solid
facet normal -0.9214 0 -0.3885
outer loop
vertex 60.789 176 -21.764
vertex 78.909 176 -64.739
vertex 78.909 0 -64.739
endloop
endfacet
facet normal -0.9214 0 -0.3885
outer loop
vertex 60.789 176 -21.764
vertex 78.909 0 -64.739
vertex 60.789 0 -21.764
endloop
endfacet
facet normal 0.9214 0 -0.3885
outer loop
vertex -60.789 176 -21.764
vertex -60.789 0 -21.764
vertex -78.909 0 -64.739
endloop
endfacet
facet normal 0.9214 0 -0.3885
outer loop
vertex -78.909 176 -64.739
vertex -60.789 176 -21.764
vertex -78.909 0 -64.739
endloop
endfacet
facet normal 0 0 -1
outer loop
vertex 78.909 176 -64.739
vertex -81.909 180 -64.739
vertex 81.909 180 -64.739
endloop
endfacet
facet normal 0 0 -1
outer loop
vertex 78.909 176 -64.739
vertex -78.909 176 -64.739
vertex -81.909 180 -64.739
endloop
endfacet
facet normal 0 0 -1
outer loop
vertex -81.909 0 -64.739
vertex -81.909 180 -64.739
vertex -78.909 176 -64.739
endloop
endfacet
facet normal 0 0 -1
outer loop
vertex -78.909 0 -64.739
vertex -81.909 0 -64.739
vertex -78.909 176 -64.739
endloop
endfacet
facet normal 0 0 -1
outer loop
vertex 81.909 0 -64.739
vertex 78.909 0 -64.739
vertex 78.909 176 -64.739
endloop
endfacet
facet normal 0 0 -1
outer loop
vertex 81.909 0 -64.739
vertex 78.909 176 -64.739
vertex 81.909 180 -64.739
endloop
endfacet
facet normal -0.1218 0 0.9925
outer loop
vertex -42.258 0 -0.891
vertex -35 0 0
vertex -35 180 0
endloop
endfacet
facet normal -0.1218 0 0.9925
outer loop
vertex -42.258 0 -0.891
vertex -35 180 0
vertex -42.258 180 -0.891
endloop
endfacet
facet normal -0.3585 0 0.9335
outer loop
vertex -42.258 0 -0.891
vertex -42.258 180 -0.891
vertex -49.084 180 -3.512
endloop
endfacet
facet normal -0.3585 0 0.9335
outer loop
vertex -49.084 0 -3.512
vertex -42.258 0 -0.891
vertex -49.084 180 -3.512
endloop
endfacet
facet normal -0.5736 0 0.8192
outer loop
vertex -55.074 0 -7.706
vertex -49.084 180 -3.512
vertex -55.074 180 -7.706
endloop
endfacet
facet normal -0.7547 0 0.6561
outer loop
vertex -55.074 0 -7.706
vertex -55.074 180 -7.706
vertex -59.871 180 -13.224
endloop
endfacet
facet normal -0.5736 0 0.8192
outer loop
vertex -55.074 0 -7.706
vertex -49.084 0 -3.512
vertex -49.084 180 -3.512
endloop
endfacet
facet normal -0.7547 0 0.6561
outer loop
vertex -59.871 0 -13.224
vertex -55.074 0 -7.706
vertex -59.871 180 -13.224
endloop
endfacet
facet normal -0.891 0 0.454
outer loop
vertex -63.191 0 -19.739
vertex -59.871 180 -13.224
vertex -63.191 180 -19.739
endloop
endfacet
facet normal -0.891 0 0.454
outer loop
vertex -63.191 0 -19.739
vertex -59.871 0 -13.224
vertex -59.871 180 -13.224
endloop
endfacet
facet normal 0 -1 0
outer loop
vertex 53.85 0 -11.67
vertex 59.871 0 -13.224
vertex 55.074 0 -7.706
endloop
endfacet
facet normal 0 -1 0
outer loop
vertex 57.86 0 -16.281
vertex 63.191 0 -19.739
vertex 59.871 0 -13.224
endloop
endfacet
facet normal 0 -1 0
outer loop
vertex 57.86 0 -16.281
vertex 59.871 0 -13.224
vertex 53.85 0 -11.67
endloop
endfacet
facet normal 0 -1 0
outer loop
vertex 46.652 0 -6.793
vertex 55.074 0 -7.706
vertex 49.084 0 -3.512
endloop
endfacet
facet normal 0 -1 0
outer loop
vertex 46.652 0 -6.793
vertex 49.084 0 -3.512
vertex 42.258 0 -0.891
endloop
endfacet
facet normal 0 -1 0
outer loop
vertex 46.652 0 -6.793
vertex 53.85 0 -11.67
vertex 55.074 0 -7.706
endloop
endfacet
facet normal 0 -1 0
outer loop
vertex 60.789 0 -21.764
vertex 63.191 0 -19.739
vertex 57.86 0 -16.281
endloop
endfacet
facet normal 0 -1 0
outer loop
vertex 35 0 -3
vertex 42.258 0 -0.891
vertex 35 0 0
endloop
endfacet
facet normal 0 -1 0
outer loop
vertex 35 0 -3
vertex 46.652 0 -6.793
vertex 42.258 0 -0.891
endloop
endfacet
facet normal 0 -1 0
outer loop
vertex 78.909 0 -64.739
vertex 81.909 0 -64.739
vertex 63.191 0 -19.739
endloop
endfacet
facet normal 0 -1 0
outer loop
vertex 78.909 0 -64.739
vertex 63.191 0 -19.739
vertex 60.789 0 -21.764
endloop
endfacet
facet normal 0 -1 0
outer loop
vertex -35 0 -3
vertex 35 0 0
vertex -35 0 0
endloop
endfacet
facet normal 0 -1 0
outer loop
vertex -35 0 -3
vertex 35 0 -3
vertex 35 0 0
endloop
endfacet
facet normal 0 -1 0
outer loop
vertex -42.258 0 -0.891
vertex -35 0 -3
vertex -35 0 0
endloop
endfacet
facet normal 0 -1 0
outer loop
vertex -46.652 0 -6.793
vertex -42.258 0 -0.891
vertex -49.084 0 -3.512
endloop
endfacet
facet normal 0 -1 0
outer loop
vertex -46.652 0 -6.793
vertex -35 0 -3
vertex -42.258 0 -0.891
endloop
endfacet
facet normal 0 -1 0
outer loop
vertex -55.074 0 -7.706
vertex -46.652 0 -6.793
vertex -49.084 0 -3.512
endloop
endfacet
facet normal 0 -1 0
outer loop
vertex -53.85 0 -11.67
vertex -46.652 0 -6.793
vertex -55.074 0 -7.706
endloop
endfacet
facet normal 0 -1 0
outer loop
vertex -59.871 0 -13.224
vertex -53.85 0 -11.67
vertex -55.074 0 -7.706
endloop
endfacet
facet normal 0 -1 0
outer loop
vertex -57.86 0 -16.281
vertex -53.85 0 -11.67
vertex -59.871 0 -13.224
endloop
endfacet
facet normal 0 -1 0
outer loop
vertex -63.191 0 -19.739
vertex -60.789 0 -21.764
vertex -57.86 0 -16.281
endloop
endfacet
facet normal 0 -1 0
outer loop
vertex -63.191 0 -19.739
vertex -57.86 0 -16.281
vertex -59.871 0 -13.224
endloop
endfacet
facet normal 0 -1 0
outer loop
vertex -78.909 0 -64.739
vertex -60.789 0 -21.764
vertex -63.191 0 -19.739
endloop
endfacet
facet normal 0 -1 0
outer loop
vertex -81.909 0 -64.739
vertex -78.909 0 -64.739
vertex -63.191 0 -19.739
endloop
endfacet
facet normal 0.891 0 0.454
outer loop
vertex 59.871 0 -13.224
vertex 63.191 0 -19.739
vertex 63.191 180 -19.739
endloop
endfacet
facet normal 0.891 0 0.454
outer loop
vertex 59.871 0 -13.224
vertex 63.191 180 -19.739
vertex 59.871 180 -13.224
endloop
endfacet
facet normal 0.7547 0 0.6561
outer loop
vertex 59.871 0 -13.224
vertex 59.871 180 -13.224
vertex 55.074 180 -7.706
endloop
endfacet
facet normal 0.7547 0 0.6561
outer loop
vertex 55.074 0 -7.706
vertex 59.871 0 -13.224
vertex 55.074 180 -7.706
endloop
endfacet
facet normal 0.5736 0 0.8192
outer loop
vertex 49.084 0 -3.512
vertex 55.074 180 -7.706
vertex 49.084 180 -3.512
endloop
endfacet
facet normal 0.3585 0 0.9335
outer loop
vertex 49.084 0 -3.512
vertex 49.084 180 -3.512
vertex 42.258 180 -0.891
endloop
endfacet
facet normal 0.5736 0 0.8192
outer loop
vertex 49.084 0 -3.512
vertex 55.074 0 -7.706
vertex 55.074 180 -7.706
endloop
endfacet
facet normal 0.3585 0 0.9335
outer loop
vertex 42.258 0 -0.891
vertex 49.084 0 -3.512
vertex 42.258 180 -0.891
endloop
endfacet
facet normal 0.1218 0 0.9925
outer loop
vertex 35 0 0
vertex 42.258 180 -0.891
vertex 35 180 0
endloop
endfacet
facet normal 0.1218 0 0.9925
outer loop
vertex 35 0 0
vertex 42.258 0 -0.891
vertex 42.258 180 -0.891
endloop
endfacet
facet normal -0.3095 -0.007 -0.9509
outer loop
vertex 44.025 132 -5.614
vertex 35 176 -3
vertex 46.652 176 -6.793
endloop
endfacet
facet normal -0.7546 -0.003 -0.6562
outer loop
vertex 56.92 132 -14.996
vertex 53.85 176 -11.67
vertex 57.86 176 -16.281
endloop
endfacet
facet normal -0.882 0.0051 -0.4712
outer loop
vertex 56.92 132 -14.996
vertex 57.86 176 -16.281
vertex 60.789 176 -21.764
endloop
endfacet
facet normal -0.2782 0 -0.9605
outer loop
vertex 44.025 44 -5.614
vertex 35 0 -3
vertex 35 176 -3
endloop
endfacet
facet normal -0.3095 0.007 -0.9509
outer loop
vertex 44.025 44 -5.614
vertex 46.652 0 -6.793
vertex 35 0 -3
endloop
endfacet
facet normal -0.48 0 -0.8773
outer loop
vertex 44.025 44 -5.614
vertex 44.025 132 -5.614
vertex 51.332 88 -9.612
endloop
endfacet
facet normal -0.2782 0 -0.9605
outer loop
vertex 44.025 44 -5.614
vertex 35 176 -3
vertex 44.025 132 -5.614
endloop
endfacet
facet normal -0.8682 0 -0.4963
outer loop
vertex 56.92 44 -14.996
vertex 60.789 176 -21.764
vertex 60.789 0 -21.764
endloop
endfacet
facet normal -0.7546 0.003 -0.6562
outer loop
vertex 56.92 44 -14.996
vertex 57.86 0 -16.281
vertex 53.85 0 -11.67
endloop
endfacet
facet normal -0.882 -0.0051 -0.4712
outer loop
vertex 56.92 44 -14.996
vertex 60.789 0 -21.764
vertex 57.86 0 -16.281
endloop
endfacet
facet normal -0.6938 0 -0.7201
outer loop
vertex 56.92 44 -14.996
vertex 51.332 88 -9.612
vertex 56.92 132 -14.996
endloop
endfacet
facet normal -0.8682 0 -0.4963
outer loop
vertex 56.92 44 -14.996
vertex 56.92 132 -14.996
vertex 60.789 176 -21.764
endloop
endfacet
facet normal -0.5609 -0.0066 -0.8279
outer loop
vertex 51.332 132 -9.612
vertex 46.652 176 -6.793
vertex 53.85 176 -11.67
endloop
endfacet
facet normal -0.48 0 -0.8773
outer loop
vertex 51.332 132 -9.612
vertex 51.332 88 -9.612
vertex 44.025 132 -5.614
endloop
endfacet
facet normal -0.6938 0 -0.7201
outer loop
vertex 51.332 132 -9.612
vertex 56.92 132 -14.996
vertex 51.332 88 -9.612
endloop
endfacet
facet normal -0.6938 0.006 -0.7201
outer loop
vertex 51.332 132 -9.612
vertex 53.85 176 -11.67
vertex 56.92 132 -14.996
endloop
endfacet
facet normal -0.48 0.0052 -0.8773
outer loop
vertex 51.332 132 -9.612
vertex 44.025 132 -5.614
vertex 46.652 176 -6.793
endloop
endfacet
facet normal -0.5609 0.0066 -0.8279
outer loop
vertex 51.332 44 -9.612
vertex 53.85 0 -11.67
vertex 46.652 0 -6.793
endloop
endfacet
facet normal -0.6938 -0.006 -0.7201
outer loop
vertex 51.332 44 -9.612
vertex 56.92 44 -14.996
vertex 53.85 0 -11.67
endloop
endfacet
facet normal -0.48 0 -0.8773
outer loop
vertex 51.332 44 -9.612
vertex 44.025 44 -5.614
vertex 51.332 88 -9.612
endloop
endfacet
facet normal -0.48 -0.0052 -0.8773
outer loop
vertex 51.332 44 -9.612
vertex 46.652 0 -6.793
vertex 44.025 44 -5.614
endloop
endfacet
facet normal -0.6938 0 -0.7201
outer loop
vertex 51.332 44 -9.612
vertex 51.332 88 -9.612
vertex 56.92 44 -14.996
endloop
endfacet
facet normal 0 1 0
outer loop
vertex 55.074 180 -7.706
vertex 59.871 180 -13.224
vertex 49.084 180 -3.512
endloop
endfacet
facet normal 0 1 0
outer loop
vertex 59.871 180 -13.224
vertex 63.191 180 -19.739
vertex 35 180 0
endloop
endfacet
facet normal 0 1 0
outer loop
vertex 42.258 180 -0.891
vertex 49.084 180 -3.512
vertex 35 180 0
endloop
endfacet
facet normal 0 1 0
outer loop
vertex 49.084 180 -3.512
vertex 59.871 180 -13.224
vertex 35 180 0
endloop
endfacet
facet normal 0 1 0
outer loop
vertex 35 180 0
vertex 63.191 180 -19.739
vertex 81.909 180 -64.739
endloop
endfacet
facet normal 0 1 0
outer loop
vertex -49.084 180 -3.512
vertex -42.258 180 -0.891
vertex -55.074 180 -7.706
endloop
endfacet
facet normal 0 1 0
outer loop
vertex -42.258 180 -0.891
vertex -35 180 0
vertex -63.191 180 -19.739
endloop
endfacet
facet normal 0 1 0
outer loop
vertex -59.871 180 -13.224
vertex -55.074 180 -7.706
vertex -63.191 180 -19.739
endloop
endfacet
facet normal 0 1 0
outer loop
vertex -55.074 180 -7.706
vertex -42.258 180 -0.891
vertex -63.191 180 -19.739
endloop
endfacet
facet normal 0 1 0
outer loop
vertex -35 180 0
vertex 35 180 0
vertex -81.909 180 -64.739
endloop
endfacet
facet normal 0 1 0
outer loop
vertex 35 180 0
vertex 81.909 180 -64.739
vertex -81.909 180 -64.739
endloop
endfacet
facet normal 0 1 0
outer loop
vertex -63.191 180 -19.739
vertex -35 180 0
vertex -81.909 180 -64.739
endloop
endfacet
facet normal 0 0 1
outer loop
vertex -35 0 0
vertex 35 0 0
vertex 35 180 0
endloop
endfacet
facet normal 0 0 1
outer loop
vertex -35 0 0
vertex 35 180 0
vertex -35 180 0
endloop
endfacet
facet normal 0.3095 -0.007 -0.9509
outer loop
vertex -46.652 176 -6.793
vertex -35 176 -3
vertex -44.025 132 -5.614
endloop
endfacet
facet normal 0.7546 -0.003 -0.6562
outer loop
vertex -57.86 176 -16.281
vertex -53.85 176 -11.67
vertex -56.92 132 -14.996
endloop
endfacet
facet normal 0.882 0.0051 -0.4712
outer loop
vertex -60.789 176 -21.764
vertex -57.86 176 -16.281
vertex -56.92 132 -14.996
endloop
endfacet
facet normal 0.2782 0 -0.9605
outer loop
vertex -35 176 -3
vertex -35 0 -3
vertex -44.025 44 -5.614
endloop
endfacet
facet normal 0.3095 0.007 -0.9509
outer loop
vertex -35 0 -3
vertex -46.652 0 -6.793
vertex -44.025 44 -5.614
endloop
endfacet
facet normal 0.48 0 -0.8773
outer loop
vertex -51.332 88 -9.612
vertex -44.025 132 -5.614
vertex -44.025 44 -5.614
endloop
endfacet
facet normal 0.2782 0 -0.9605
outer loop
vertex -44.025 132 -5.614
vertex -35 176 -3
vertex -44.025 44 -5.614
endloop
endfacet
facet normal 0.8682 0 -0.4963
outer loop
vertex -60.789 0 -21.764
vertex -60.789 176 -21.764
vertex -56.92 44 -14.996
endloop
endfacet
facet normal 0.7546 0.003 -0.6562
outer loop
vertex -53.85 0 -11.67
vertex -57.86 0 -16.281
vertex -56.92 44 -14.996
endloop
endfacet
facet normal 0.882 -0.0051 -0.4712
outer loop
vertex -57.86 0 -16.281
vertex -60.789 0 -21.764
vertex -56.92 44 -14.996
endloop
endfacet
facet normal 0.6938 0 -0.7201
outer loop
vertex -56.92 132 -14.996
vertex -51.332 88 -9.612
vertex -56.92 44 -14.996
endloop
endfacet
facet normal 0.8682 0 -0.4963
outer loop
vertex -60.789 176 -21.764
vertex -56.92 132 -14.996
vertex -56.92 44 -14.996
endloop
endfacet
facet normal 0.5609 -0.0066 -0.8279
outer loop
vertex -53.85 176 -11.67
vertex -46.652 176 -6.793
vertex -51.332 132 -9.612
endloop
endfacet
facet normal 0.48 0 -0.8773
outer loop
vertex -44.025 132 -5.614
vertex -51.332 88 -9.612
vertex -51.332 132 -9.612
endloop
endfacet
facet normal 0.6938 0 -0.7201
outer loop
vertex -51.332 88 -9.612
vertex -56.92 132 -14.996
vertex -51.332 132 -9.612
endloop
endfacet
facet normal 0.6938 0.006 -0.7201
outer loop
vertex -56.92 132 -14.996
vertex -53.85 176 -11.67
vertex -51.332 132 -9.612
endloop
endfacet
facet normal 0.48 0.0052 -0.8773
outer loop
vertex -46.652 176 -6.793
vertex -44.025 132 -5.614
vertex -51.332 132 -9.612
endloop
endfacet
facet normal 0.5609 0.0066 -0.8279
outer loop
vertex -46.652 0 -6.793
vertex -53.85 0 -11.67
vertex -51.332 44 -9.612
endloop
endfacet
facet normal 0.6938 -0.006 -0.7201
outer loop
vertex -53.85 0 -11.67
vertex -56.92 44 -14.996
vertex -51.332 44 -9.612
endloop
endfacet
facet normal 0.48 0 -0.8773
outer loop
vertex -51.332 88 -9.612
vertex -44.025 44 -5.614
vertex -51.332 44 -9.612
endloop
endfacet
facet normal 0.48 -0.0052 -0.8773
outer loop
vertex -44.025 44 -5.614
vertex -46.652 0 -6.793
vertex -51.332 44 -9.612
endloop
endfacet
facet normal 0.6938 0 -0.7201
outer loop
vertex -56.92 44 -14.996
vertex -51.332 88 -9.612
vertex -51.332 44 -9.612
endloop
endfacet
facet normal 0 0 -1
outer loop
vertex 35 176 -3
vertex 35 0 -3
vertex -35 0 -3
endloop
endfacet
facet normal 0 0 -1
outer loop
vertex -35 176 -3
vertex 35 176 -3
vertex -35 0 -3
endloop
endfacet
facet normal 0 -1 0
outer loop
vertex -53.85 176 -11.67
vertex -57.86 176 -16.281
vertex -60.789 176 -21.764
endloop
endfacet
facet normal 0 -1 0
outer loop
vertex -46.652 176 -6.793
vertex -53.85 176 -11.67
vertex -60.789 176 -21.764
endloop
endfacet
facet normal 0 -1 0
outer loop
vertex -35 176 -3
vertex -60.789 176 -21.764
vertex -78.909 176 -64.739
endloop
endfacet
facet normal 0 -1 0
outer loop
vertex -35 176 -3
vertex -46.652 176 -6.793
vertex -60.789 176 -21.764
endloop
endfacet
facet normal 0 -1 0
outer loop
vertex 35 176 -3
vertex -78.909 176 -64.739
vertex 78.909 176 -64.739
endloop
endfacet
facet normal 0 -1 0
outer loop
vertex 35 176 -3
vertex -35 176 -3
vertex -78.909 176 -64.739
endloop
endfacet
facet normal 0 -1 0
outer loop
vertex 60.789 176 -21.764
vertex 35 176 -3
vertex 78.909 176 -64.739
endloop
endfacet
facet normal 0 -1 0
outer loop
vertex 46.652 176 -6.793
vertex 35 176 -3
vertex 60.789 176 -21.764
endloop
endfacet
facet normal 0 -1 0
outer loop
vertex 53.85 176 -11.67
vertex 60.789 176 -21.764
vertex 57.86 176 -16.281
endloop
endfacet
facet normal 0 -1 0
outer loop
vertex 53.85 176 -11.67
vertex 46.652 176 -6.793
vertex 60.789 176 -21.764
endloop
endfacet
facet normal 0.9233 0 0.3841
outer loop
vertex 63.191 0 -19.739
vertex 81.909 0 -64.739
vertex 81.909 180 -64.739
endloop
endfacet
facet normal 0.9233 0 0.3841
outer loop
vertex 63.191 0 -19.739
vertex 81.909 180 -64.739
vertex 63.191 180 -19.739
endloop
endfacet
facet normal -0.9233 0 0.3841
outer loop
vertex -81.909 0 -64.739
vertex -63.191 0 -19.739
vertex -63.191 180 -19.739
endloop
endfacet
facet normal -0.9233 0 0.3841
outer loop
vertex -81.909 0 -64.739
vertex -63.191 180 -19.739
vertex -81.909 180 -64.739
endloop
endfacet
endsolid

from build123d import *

# Parameters (mm, degrees)
BOSS_EXTRUDE1_DEPTH = 180
CUT_EXTRUDE1_DEPTH  = 176


with BuildPart() as part:
    # Sketch1 → Boss-Extrude1 (new body)
    with BuildSketch(Plane(origin=(0, 0, 0), x_dir=(1, 0, 0), z_dir=(0, 1, 0))):
        with BuildLine():
            Line((35, 0), (-35, 0))
            ThreePointArc((-35, 0), (-52.207293091, 5.425438671), (-63.190778624, 19.7393957))
            Line((-63.190778624, 19.7393957), (-81.908713693, 64.7393957))
            Line((-81.908713693, 64.7393957), (81.908713693, 64.7393957))
            Line((81.908713693, 64.7393957), (63.190778624, 19.7393957))
            ThreePointArc((63.190778624, 19.7393957), (52.207293091, 5.425438671), (35, 0))
        make_face()
    extrude(amount=BOSS_EXTRUDE1_DEPTH)

    # Sketch4 → Cut-Extrude1 (cut)
    with BuildSketch(Plane.XZ):
        with BuildLine():
            Line((-78.908713693, -64.7393957), (78.908713693, -64.7393957))
            Line((78.908713693, -64.7393957), (60.788869437, -21.764400459))
            add(Edge.make_bspline(
                [(35, -3), (54.769523096, -6.842262635), (60.788869437, -21.764400459)],
                knots=[0, 0, 0, 1, 1, 1], degree=2))
            Line((35, -3), (-35, -3))
            add(Edge.make_bspline(
                [(-35, -3), (-54.769523096, -6.842262635), (-60.788869437, -21.764400459)],
                knots=[0, 0, 0, 1, 1, 1], degree=2))
            Line((-60.788869437, -21.764400459), (-78.908713693, -64.7393957))
        make_face()
    extrude(amount=-CUT_EXTRUDE1_DEPTH, mode=Mode.SUBTRACT)


solid = part.part
